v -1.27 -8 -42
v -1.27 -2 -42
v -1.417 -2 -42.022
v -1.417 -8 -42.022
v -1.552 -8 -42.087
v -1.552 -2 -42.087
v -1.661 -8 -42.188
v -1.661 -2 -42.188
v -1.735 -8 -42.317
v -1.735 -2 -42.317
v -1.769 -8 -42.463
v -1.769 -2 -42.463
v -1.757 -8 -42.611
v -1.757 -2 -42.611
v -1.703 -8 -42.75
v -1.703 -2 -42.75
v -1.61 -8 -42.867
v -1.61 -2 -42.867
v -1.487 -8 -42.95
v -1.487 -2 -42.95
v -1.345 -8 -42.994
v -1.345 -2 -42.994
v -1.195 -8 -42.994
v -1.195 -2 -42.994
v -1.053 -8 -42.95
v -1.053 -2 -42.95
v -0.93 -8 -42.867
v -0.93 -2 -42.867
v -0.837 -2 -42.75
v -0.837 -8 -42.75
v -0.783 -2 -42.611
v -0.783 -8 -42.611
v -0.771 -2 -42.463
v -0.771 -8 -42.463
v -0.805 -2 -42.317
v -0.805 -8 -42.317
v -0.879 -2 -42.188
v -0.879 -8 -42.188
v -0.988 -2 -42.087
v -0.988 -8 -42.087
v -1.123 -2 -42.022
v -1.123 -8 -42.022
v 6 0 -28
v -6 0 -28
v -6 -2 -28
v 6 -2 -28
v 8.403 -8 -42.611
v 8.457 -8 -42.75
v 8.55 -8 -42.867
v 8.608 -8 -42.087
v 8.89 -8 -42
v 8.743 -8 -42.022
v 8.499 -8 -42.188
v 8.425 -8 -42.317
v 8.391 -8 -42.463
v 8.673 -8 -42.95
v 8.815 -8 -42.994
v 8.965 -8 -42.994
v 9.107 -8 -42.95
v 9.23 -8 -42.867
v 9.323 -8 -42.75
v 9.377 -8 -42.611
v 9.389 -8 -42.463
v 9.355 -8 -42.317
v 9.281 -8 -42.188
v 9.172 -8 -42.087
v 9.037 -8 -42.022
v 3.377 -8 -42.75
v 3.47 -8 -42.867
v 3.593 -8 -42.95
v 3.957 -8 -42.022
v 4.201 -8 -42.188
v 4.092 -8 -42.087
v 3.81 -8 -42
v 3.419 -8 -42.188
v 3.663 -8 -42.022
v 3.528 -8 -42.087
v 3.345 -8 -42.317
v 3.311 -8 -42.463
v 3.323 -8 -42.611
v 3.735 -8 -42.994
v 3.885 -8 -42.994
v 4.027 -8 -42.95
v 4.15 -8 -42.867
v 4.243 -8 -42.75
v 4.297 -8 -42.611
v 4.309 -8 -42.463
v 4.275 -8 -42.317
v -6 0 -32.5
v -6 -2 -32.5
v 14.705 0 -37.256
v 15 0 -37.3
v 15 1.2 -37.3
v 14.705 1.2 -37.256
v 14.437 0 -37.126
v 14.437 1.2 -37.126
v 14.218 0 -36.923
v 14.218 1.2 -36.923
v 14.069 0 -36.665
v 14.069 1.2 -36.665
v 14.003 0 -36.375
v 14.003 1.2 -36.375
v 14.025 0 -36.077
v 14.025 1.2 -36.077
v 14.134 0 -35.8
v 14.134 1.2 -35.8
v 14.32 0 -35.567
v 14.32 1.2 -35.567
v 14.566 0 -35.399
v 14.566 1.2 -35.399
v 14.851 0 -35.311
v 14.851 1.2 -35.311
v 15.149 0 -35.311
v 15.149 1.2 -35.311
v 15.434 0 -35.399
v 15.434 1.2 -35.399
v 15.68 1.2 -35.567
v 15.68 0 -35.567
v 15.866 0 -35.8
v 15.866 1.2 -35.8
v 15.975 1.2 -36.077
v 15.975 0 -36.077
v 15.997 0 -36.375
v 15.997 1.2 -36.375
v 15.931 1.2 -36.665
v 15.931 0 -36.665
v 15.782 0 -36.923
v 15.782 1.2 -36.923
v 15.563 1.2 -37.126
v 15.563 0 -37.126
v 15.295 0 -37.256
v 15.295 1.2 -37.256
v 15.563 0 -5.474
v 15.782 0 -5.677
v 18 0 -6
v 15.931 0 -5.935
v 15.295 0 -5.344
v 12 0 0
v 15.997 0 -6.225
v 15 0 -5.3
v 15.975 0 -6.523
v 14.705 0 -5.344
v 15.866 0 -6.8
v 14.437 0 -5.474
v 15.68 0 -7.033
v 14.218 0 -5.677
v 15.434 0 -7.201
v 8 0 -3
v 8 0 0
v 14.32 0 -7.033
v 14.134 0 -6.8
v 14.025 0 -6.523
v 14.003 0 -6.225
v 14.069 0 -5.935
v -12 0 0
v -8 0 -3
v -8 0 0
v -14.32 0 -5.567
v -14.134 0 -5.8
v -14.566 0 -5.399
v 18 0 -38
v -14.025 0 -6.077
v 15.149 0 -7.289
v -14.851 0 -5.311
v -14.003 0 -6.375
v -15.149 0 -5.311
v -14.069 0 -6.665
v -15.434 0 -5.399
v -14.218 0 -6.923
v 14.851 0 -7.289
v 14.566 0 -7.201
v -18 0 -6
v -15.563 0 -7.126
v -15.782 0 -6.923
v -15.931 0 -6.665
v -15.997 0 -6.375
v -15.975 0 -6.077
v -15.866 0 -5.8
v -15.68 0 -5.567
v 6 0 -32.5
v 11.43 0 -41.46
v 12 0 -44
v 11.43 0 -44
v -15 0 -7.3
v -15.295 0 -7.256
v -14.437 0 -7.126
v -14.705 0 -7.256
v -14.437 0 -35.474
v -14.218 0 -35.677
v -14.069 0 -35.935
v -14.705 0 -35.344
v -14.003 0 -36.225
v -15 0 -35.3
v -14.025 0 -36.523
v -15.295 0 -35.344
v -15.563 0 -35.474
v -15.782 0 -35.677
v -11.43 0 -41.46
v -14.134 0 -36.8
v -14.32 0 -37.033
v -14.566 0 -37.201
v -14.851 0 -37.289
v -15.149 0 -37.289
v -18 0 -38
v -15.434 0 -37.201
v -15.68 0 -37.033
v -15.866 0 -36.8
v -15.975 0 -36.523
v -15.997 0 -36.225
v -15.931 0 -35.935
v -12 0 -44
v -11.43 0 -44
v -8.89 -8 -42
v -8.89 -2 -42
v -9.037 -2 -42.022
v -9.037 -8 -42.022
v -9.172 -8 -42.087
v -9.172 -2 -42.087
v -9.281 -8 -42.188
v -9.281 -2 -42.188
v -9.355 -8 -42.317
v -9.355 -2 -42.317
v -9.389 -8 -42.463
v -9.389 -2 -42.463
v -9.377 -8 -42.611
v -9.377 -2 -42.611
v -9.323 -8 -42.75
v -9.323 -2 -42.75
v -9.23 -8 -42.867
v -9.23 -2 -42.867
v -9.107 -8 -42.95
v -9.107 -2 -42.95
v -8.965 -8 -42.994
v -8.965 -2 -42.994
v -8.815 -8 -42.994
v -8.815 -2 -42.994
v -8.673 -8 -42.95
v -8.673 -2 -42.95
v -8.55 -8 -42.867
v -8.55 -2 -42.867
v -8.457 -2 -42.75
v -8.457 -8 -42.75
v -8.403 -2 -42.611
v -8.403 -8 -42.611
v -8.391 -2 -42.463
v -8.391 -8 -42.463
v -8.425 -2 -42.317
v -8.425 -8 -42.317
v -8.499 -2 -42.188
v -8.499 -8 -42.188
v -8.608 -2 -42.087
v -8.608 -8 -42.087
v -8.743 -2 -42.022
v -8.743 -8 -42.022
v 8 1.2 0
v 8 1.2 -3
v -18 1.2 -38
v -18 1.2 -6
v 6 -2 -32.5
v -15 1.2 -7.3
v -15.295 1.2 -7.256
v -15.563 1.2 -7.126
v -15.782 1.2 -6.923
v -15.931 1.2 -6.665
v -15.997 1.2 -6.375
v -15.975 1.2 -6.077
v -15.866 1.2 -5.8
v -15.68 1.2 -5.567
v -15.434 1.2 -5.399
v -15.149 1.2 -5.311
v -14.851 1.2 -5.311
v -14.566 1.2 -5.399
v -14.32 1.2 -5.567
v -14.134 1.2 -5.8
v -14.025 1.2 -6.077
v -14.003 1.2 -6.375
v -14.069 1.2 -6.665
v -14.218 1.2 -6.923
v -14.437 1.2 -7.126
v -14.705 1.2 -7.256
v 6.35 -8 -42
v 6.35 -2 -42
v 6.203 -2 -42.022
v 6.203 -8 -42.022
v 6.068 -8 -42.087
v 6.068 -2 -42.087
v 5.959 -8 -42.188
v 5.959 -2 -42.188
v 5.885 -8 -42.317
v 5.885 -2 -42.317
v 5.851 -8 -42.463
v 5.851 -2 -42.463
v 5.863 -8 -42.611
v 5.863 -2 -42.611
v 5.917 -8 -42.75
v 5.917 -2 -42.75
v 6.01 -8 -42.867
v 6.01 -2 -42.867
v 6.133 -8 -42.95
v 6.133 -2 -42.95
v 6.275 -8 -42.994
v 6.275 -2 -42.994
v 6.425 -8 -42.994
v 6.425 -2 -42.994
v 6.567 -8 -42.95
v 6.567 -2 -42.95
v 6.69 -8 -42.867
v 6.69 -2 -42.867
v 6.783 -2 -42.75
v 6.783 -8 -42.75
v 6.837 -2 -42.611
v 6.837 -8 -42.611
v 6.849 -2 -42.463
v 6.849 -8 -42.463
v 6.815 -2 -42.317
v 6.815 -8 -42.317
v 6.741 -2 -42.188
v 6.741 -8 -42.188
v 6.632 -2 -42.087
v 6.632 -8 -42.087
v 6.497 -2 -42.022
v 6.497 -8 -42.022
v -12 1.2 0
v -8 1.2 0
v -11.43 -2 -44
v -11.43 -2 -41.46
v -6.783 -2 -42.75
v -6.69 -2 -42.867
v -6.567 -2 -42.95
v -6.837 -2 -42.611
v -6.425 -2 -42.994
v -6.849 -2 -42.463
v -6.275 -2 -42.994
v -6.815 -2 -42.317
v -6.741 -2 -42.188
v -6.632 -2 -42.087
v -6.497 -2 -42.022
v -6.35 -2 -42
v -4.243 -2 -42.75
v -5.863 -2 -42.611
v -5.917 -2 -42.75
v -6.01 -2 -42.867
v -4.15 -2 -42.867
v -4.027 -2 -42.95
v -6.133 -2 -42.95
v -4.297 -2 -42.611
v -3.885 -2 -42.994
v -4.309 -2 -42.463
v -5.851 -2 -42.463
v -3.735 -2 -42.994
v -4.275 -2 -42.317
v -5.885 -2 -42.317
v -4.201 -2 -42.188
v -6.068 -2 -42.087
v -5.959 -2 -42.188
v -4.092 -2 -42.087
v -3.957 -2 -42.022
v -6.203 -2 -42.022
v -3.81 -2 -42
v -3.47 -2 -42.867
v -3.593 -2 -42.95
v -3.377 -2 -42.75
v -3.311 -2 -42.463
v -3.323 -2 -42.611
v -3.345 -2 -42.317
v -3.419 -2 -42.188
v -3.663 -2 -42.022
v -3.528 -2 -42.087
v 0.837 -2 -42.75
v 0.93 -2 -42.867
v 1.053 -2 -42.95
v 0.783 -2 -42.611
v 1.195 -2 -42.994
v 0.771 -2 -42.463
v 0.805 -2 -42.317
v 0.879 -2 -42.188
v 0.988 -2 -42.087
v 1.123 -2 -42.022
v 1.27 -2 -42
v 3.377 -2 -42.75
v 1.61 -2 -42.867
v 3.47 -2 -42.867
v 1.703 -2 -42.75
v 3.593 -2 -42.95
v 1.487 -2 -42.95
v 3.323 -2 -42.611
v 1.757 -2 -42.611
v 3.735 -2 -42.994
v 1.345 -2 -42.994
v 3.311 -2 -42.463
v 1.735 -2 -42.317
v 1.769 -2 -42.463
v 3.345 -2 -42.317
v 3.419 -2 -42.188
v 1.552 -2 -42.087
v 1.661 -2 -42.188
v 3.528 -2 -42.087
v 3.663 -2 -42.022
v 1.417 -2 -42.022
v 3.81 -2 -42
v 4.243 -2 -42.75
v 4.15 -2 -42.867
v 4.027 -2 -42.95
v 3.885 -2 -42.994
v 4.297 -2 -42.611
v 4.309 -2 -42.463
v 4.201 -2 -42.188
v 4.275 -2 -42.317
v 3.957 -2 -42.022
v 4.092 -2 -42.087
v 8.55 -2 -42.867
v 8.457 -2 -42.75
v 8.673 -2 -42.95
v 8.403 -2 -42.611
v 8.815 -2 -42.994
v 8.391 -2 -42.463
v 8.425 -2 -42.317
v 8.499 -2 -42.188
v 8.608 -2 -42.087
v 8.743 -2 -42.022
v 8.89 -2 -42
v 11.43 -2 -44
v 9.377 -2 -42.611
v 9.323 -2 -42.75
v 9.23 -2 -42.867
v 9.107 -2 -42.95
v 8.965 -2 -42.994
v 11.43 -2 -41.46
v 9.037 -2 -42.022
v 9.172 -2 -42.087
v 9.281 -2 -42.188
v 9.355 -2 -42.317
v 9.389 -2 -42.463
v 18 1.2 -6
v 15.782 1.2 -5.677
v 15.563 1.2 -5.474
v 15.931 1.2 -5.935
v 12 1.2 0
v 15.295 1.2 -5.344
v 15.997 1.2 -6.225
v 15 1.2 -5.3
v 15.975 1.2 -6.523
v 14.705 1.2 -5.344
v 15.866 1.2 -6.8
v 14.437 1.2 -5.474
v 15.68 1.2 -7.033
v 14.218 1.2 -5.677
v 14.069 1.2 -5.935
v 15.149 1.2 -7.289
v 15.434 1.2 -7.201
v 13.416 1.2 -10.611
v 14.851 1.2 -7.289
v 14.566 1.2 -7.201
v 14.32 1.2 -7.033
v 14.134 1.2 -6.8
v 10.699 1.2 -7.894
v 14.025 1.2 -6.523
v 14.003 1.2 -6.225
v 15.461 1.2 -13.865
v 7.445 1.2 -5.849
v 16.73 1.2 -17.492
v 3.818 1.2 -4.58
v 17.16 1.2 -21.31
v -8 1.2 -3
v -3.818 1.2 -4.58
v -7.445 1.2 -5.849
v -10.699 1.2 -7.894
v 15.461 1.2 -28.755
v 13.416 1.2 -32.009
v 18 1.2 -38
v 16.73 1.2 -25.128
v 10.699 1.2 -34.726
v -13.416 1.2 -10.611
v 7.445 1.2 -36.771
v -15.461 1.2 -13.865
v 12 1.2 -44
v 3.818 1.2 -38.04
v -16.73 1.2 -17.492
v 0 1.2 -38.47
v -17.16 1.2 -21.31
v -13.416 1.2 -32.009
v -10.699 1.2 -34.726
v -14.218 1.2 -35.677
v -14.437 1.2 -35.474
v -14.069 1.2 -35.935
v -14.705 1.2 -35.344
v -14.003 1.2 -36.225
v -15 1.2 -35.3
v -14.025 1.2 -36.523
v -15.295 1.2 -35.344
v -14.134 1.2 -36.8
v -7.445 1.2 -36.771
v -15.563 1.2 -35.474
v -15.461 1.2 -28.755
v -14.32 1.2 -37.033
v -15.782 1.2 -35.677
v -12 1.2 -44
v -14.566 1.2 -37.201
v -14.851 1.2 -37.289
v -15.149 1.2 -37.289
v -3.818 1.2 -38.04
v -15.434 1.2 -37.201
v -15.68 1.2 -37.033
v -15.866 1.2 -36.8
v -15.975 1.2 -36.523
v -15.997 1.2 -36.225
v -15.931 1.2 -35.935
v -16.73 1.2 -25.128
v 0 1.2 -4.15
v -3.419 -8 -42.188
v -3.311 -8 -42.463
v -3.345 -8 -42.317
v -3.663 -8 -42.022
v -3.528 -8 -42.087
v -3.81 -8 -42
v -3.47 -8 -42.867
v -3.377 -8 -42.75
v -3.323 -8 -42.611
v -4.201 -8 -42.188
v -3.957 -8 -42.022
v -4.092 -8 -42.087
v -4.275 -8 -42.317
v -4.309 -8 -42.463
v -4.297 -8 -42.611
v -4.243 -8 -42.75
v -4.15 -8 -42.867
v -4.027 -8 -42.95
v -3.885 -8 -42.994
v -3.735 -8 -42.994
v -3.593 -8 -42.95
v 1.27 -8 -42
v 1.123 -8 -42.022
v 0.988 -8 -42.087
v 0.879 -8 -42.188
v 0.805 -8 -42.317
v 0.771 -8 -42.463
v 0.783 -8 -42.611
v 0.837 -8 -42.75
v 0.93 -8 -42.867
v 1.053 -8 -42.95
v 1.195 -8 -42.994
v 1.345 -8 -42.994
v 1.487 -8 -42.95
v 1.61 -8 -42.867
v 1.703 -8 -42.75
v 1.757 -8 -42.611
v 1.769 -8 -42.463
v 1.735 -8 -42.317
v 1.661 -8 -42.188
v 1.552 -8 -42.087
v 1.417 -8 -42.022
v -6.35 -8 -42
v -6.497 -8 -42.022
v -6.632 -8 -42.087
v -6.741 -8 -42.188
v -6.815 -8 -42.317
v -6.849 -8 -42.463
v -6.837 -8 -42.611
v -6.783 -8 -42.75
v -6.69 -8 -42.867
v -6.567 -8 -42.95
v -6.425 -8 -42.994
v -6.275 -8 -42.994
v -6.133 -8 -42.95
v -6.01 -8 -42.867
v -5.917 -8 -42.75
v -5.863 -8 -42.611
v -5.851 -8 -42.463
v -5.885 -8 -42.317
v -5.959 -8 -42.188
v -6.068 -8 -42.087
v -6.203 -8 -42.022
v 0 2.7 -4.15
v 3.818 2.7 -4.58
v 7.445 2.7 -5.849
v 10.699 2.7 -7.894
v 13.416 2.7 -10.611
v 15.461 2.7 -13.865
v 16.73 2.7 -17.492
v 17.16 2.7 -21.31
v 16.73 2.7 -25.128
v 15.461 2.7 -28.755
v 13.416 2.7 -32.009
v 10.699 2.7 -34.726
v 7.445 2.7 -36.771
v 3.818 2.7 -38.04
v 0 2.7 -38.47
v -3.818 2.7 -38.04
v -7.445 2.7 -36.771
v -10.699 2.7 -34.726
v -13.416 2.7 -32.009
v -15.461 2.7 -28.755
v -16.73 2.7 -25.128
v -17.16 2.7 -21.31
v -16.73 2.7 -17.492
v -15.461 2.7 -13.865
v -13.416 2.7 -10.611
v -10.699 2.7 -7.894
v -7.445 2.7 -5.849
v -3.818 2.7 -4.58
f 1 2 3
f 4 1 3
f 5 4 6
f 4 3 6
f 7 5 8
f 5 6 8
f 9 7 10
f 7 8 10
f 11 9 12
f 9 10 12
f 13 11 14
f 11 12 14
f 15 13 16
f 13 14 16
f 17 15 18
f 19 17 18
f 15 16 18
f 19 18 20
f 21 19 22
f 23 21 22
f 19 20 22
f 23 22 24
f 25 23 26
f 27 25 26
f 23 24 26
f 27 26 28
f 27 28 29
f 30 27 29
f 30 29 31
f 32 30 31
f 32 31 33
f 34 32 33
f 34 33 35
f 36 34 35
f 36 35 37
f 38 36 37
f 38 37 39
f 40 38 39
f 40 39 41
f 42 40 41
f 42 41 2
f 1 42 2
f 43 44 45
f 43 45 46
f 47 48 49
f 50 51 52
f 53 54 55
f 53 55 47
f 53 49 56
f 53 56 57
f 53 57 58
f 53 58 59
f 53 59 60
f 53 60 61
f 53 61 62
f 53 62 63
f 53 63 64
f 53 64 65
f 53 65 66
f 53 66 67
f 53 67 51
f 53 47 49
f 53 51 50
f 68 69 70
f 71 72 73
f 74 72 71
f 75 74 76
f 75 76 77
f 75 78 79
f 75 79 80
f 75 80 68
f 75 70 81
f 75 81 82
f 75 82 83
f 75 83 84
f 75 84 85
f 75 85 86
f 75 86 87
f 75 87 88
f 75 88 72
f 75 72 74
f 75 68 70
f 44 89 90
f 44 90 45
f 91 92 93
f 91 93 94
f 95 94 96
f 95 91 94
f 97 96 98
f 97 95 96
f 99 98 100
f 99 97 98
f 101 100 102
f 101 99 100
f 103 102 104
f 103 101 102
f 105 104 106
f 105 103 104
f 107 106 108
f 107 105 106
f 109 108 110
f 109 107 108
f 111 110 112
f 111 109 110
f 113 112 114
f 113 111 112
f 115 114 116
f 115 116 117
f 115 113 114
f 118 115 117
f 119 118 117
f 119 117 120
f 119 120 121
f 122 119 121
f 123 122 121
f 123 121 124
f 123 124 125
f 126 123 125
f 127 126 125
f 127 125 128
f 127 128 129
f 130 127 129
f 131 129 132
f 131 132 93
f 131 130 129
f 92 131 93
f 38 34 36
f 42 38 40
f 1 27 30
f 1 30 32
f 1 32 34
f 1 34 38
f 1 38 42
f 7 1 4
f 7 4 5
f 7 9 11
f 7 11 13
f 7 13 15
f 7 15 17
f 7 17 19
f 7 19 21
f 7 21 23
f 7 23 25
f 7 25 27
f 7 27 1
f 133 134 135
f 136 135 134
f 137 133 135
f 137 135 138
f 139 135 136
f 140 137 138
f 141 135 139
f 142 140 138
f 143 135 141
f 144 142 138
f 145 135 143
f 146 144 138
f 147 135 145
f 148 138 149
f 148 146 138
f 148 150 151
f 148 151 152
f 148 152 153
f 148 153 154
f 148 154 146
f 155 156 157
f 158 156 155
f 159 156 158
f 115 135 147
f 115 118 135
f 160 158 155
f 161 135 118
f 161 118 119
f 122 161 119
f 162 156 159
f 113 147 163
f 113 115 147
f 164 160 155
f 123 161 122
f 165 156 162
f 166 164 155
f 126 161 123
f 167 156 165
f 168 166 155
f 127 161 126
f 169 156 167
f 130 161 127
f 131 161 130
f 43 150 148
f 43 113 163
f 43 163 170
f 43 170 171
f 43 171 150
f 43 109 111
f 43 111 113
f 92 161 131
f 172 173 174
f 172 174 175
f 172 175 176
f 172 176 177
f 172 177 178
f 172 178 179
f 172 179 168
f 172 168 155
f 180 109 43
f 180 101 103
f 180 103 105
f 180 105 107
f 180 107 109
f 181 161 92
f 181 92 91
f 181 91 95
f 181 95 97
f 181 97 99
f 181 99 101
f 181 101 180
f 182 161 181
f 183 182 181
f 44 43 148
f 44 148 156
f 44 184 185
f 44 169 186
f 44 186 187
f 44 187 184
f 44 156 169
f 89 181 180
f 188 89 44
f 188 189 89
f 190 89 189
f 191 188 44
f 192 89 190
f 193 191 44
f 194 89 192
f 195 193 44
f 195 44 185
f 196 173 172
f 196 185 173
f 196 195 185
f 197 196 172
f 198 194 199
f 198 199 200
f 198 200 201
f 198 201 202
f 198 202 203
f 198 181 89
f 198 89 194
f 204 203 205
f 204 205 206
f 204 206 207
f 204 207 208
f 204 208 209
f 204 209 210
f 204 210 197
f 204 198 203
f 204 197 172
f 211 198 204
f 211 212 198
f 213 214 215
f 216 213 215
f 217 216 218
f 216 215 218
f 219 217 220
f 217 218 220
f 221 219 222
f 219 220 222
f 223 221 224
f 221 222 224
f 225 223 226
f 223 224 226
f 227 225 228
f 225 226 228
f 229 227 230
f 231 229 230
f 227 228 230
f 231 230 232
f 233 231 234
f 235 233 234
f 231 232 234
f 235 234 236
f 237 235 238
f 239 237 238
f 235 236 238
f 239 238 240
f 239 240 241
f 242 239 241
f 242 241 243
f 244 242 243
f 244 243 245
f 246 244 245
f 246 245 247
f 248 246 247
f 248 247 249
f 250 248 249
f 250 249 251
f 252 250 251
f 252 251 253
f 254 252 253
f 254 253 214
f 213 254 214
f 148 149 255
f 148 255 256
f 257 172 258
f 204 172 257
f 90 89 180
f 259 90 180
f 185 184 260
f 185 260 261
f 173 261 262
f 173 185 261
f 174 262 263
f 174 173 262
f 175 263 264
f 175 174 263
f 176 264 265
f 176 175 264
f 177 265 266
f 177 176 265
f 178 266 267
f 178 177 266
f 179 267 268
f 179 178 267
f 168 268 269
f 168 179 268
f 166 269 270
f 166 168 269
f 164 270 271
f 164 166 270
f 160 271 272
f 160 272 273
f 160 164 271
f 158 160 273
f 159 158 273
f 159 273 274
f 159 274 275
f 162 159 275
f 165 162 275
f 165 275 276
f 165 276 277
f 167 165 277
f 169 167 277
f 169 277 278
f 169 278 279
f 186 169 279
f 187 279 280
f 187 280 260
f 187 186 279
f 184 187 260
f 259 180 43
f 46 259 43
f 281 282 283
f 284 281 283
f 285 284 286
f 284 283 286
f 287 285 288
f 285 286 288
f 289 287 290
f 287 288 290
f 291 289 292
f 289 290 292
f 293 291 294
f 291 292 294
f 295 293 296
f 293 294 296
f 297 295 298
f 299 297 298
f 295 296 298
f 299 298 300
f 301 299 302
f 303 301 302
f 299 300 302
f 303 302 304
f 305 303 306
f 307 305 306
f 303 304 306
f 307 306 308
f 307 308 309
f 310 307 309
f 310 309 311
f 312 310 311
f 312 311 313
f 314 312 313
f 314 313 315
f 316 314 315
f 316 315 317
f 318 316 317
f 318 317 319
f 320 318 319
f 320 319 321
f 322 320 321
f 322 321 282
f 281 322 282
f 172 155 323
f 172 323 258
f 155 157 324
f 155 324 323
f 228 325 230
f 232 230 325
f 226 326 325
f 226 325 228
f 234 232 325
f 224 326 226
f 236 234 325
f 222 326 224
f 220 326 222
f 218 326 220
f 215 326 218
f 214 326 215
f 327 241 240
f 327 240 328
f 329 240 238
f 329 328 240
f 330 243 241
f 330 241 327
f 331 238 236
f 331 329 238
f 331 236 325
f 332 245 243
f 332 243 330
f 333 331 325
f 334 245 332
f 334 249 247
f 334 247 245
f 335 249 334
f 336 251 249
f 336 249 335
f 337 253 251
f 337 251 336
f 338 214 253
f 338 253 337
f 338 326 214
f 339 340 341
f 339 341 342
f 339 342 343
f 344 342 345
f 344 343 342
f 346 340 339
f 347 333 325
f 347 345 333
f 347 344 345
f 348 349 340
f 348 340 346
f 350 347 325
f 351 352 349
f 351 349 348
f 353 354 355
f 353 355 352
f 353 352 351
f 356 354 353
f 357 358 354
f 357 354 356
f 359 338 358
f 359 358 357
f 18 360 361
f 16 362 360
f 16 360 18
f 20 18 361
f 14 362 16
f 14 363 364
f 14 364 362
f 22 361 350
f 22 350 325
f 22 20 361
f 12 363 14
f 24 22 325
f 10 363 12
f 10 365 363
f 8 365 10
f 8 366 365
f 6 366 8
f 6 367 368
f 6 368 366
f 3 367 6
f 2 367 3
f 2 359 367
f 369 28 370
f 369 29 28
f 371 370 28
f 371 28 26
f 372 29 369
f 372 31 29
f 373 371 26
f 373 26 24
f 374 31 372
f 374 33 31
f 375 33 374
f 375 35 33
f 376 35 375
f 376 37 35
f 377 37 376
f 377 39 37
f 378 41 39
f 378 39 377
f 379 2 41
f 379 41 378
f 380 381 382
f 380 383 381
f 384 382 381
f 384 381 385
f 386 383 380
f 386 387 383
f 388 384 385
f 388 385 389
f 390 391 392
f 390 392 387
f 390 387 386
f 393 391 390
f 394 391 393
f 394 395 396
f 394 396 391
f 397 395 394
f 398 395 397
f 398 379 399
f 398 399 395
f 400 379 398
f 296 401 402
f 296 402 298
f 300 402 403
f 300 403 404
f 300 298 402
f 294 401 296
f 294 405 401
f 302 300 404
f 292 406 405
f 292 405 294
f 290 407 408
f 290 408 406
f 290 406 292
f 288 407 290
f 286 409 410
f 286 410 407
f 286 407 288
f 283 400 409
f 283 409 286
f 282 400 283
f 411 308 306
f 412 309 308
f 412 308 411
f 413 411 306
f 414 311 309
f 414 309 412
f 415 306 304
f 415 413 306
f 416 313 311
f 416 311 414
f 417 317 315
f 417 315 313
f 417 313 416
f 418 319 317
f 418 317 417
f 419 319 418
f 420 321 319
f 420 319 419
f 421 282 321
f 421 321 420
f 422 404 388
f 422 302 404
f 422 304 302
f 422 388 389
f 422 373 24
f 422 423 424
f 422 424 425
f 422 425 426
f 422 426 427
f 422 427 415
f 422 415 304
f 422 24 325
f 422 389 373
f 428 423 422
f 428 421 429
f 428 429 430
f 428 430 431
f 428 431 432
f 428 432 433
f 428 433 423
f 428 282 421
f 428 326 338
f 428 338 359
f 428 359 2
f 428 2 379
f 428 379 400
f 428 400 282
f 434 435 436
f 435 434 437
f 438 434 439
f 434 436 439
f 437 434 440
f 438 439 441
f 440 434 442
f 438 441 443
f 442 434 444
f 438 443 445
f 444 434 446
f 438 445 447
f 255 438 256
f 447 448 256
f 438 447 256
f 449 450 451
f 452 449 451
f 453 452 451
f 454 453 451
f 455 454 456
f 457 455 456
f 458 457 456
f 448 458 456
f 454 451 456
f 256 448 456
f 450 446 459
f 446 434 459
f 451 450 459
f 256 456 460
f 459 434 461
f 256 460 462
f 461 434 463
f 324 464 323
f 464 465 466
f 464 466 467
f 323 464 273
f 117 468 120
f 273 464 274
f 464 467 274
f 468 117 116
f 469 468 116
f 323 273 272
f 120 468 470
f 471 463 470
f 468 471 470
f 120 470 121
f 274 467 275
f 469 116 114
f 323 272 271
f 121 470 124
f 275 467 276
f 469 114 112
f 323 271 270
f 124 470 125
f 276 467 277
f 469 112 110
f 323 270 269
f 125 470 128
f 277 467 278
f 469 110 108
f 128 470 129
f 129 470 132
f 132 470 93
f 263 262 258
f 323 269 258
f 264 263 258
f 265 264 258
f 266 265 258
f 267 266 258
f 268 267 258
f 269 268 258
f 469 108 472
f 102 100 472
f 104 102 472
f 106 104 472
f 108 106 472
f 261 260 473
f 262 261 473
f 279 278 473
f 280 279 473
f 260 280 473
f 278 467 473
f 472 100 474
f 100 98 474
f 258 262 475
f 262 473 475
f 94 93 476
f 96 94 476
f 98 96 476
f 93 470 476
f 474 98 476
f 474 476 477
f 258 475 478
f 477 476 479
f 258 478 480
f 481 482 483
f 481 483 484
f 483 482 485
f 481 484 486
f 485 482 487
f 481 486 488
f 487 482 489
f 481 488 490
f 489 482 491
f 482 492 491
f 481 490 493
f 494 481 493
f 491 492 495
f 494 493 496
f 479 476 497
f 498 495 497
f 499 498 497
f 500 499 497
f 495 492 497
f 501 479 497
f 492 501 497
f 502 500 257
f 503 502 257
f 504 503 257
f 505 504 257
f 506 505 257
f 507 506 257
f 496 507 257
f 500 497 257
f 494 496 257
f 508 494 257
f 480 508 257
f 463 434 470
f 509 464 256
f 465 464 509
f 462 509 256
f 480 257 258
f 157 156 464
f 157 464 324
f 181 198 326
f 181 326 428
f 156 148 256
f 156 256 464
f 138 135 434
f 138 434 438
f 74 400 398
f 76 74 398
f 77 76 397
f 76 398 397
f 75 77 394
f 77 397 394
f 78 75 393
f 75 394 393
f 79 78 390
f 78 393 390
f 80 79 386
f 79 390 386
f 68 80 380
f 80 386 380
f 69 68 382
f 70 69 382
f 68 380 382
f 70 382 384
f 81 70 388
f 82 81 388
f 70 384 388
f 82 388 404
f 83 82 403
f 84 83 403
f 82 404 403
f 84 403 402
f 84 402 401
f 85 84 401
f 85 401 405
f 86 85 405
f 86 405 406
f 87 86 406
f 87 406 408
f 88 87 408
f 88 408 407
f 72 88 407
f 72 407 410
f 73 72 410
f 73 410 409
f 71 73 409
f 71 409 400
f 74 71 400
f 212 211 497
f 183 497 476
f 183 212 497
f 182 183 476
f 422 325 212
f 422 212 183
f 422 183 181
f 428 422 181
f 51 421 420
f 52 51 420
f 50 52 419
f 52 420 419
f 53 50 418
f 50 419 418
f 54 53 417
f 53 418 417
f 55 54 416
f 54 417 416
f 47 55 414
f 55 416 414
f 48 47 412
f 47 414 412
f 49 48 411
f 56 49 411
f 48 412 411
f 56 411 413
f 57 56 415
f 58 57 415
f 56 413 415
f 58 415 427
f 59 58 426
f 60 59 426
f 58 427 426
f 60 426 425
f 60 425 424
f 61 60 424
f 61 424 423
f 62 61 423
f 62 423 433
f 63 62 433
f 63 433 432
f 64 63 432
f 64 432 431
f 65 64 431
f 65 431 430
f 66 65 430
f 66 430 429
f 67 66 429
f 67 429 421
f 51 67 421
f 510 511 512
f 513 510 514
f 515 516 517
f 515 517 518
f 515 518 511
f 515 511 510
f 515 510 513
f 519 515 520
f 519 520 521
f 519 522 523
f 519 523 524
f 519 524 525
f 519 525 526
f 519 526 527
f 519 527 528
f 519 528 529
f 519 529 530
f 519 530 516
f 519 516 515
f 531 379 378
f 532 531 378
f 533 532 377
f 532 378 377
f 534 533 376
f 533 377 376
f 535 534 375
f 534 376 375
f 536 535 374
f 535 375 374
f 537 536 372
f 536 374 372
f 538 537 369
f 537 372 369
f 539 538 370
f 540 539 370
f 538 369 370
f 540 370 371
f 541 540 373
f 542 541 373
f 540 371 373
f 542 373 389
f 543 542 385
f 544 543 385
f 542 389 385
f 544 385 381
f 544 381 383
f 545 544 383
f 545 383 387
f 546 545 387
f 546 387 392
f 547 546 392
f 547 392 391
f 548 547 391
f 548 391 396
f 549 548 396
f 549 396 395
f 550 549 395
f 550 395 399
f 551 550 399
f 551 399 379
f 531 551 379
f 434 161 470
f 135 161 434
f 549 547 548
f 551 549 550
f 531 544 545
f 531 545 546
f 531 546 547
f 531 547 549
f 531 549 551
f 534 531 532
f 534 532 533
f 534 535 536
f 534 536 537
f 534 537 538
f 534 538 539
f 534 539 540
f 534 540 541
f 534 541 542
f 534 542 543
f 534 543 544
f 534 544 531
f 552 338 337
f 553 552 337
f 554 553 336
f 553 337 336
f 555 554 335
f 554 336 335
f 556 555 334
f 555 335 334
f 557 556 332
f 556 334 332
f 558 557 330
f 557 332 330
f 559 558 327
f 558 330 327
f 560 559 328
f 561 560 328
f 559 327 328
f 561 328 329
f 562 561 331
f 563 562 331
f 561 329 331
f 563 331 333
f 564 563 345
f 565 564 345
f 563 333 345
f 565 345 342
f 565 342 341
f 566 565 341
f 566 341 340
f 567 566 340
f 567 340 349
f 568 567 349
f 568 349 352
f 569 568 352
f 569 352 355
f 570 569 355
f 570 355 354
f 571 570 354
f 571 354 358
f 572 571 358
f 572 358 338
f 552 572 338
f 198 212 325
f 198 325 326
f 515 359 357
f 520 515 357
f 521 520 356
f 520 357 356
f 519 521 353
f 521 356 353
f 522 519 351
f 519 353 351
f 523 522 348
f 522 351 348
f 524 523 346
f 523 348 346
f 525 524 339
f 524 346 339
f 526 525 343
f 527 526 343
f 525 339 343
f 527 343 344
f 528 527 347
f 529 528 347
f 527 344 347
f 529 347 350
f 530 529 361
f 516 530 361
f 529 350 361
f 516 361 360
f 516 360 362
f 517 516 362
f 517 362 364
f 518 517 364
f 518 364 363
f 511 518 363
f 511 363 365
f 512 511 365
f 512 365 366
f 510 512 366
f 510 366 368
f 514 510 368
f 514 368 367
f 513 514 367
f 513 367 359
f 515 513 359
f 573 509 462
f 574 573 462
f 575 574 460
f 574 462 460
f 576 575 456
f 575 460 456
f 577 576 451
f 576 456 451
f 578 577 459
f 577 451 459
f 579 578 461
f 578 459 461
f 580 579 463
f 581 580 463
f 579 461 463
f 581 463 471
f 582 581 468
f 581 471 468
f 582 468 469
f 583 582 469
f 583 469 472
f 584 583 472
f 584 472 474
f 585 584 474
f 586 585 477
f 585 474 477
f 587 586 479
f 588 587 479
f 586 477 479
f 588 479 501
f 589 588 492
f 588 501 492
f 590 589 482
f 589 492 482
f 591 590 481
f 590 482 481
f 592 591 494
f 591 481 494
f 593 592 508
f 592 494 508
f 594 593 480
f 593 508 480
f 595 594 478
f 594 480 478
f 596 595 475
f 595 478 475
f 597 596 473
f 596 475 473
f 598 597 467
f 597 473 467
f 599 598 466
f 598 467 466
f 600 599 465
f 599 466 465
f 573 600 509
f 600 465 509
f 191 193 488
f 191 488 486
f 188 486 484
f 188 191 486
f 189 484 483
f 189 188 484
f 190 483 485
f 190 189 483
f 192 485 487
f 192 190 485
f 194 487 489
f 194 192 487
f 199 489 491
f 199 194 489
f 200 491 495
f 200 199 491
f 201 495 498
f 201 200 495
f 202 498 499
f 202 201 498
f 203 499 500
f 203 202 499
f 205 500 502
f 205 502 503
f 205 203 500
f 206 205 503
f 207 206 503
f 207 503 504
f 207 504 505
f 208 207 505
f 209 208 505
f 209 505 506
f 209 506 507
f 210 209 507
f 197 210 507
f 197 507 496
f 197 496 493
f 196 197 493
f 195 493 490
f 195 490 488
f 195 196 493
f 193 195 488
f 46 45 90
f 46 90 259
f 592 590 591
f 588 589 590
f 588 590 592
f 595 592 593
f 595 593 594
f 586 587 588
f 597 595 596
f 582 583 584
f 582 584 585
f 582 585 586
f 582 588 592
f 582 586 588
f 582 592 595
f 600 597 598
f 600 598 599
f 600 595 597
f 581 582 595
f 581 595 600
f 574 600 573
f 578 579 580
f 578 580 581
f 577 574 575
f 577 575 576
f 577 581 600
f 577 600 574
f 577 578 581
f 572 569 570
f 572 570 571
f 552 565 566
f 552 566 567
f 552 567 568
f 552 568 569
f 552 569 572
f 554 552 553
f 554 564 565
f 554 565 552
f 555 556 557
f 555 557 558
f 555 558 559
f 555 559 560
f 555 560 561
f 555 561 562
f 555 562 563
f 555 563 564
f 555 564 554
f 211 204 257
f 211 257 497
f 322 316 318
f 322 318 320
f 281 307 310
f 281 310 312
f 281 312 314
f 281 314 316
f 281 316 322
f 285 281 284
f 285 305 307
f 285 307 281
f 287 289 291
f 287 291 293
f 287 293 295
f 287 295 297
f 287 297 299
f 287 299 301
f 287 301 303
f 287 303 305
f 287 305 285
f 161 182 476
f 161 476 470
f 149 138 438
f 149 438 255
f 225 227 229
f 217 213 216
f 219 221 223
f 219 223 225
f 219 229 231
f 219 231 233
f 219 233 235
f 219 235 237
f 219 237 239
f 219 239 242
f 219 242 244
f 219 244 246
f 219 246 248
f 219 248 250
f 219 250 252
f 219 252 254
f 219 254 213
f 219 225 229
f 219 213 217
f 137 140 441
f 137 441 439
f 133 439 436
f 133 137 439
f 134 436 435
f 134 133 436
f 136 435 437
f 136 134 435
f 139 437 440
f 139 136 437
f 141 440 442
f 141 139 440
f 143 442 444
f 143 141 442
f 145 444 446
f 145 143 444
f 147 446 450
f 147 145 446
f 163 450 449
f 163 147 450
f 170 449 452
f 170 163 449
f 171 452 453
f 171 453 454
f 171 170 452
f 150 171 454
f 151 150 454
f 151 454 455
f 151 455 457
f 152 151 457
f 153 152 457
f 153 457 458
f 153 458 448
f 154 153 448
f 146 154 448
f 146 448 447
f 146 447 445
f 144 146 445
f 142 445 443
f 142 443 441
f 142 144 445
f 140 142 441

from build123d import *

# Parameters (mm, degrees)
SKETCH_1_R      = 1
EXTRUDE_1_DEPTH = 1.2
SKETCH_2_R      = 17.16
EXTRUDE_2_DEPTH = 1.5
SKETCH_3_W      = 12
SKETCH_3_H      = 4.5
SKETCH_3_W_2    = 22.86
SKETCH_3_H_2    = 2.54
EXTRUDE_3_DEPTH = 2
SKETCH_4_R      = 0.5
EXTRUDE_4_DEPTH = 8


with BuildPart() as part:
    # 草图1 → 凸台-拉伸1 (new body)
    with BuildSketch(Plane(origin=(0, 0, 0), x_dir=(1, 0, 0), z_dir=(0, 1, 0))):
        Polygon((-12, 44), (12, 44), (18, 38), (18, 6), (12, 0), (8, 0), (8, 3), (-8, 3), (-8, 0), (-12, 0), (-18, 6), (-18, 38), align=None)
        with Locations(Location((15, 6.3, 0), (0, 0, 270))):
            Circle(SKETCH_1_R, mode=Mode.SUBTRACT)
        with Locations(Location((15, 36.3, 0), (0, 0, 90))):
            Circle(SKETCH_1_R, mode=Mode.SUBTRACT)
        with Locations(Location((-15, 6.3, 0), (0, 0, 90))):
            Circle(SKETCH_1_R, mode=Mode.SUBTRACT)
        with Locations(Location((-15, 36.3, 0), (0, 0, 270))):
            Circle(SKETCH_1_R, mode=Mode.SUBTRACT)
    extrude(amount=EXTRUDE_1_DEPTH)

    # 草图2 → 凸台-拉伸2 (add)
    with BuildSketch(Plane(origin=(0, 1.2, 0), x_dir=(1, 0, 0), z_dir=(0, 1, 0))):
        with Locations(Location((0, 21.31, 0), (0, 0, 270))):
            Circle(SKETCH_2_R)
    extrude(amount=EXTRUDE_2_DEPTH)

    # 草图3 → 凸台-拉伸3 (add)
    with BuildSketch(Plane.XZ):
        with Locations((0, -30.25)):
            Rectangle(SKETCH_3_W, SKETCH_3_H)
        with Locations((0, -42.73)):
            Rectangle(SKETCH_3_W_2, SKETCH_3_H_2)
    extrude(amount=EXTRUDE_3_DEPTH)

    # 草图4 → 凸台-拉伸4 (add)
    with BuildSketch(Plane.XZ):
        with Locations(Location((-1.27, -42.5, 0), (0, 0, 90))):
            Circle(SKETCH_4_R)
        with Locations(Location((-3.81, -42.5, 0), (0, 0, 90))):
            Circle(SKETCH_4_R)
        with Locations(Location((-6.35, -42.5, 0), (0, 0, 90))):
            Circle(SKETCH_4_R)
        with Locations(Location((-8.89, -42.5, 0), (0, 0, 90))):
            Circle(SKETCH_4_R)
        with Locations(Location((8.89, -42.5, 0), (0, 0, 90))):
            Circle(SKETCH_4_R)
        with Locations(Location((6.35, -42.5, 0), (0, 0, 90))):
            Circle(SKETCH_4_R)
        with Locations(Location((3.81, -42.5, 0), (0, 0, 90))):
            Circle(SKETCH_4_R)
        with Locations(Location((1.27, -42.5, 0), (0, 0, 90))):
            Circle(SKETCH_4_R)
    extrude(amount=EXTRUDE_4_DEPTH)


solid = part.part
